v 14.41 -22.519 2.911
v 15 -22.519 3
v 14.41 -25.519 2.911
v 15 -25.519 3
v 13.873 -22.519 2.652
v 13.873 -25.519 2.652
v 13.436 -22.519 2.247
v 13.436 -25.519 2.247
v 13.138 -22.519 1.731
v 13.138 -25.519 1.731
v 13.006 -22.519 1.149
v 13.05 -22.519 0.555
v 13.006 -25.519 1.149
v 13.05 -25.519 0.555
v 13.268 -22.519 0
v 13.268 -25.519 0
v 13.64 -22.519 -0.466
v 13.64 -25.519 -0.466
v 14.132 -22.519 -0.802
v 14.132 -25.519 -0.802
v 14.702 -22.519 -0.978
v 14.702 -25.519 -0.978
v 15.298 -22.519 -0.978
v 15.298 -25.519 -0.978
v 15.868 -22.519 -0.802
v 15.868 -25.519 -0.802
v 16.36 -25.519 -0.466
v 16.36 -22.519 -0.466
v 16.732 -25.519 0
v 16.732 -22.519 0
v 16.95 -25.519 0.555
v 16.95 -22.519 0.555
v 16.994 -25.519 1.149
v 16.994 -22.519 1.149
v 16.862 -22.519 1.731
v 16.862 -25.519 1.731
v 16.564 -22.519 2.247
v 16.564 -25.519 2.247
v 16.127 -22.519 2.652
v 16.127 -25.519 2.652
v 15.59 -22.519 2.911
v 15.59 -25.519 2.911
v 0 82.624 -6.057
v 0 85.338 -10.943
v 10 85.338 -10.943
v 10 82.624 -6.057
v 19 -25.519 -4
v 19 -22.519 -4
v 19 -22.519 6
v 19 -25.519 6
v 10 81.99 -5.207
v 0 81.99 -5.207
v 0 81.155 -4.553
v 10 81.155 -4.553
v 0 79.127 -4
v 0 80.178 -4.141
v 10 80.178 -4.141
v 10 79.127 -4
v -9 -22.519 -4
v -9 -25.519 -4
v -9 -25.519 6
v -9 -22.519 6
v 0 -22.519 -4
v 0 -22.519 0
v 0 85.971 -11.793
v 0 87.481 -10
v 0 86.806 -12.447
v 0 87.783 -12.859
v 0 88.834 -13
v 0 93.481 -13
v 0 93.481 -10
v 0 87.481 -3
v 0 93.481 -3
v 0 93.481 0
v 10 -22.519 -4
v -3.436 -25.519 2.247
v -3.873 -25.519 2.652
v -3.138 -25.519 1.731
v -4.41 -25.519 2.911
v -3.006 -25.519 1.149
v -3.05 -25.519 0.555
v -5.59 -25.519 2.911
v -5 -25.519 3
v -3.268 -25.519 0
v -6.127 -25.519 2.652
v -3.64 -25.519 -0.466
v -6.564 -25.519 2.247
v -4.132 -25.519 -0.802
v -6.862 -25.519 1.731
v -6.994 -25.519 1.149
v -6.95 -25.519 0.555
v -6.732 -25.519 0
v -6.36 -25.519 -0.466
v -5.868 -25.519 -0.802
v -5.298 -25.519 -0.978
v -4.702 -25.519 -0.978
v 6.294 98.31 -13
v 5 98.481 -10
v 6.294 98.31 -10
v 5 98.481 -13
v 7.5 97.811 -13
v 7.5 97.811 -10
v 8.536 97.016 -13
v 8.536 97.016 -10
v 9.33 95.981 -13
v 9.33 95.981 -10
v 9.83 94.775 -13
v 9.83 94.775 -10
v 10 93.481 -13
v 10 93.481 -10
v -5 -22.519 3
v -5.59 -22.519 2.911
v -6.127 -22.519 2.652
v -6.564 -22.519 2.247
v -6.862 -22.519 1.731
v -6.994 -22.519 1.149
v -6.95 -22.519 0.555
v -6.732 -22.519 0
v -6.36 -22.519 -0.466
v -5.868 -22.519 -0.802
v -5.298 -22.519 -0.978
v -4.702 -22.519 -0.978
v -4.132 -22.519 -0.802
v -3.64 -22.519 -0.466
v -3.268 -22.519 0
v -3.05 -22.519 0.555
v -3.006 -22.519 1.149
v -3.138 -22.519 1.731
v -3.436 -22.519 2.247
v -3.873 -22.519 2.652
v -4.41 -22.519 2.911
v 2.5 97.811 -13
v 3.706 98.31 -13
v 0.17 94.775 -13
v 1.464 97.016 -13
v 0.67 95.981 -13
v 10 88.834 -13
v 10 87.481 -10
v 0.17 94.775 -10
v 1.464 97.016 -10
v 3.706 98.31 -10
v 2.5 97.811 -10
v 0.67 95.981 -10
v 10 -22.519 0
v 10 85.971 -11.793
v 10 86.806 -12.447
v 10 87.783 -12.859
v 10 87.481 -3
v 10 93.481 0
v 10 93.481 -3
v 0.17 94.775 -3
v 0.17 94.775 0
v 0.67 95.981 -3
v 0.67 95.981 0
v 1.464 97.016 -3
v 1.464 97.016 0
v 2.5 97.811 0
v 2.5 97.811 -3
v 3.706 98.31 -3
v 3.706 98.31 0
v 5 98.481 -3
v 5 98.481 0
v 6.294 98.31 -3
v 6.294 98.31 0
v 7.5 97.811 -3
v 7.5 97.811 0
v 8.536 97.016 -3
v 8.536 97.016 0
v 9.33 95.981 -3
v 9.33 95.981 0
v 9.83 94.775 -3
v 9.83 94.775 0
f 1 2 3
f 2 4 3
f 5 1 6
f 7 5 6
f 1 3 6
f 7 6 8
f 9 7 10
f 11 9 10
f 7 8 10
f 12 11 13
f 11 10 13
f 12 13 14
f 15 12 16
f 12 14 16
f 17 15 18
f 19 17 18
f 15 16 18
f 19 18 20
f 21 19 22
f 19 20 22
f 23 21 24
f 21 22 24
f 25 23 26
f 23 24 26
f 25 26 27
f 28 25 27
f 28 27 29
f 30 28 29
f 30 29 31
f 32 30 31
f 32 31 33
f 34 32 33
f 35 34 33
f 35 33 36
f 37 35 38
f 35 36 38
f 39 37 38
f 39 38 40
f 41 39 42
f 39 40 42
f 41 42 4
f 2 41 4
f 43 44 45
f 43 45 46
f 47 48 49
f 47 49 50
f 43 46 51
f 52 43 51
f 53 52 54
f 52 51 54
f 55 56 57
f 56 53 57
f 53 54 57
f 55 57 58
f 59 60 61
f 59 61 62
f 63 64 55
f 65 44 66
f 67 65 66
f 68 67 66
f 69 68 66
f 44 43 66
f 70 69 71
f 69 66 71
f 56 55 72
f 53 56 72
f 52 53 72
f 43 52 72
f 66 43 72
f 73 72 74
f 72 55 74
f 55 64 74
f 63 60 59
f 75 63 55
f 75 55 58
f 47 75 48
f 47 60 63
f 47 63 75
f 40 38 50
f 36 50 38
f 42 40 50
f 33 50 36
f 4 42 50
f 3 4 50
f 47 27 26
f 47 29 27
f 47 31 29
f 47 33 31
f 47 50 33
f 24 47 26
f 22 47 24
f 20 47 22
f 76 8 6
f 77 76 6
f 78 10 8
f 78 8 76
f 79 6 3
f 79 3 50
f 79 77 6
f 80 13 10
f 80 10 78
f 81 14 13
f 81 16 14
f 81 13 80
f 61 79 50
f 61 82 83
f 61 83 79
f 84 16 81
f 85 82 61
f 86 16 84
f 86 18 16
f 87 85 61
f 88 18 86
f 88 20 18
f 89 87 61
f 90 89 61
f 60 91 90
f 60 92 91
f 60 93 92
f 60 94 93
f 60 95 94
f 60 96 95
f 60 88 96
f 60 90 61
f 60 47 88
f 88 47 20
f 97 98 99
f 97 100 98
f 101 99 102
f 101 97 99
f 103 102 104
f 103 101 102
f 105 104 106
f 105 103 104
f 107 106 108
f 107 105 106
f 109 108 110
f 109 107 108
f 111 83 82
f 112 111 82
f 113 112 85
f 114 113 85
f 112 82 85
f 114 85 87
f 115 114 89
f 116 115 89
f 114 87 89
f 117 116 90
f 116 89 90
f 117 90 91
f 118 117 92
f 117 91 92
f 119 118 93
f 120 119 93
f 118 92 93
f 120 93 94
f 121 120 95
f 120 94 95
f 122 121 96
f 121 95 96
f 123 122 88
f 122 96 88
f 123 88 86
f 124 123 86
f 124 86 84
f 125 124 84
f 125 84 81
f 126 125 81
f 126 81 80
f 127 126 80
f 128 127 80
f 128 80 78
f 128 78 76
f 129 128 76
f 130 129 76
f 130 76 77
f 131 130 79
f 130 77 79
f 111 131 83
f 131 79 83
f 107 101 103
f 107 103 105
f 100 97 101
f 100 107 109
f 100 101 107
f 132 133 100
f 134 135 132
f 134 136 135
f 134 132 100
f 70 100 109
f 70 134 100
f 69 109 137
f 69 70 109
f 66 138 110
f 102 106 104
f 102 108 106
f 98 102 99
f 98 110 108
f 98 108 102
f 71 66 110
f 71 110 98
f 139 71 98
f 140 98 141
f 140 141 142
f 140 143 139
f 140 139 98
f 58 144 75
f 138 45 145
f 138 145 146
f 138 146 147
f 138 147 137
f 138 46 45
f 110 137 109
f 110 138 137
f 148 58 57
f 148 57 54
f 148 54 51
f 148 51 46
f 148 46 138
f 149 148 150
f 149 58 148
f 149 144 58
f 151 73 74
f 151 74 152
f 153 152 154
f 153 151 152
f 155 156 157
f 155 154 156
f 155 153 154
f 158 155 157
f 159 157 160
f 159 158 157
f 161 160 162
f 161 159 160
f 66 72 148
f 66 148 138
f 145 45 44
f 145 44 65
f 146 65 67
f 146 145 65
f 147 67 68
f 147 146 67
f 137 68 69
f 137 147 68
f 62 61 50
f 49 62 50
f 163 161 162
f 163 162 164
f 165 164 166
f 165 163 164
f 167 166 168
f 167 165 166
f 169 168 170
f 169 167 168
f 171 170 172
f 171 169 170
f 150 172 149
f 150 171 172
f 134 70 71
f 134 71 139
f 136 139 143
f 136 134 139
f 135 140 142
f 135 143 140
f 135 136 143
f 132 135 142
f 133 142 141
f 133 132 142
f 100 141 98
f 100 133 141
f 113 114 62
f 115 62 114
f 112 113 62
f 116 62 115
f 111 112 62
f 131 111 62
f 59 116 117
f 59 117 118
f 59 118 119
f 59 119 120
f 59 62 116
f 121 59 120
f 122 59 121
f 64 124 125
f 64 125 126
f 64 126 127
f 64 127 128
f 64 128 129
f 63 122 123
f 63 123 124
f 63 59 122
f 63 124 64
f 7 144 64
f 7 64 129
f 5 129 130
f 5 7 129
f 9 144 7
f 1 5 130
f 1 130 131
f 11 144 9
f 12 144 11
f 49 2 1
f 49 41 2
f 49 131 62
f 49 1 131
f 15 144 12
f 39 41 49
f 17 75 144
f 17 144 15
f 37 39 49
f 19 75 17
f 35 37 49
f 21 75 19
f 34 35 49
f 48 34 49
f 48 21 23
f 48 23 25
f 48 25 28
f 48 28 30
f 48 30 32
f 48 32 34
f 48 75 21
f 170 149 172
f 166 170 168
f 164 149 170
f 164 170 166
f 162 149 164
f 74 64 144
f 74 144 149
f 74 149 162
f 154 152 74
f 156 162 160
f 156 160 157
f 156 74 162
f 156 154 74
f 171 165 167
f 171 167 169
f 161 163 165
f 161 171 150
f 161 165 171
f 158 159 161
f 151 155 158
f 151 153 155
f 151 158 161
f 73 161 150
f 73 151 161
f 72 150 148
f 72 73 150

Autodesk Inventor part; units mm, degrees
ref_plane "YZ Plane" through (0, 0, 0) normal (1, 0, 0) x (0, 1, 0)
ref_plane "XZ Plane" through (0, 0, 0) normal (0, 1, 0) x (-1, 0, 0)
sketch "Sketch5" plane through (0, 0, 0) normal (1, 0, 0) x (0, 1, 0)
  line L0 (0, 0) -> (98.4806, 0)
  line L1 (98.4806, 0) -> (98.4806, -3)
  line L2 (98.4806, -3) -> (87.4806, -3)
  line L3 (87.4806, -3) -> (87.4806, -10)
  line L4 (87.4806, -10) -> (98.4806, -10)
  line L5 (98.4806, -10) -> (98.4806, -13)
  line L6 (98.4806, -13) -> (86.4806, -13)
  line L7 (86.4806, -13) -> (81.4806, -4)
  line L8 (-22.5194, 0) -> (0, 0)
  line L9 (-22.5194, -4) -> (81.4806, -4)
  line L10 (-22.5194, -4) -> (-22.5194, 0)
  dimension "d29" = 3
  dimension "d30" = 7
  dimension "d31" = 3
  dimension "d33" = 11
  dimension "d40" = 4
  dimension "d41" = 5
  dimension "d48" = 12
  dimension "d53" = 121
ref_plane "Work Plane1" through (0, 0, 0) normal (0, 0, 1) x (1, 0, 0)
extrude "Extrusion5" add sketch "Sketch5" along normal blind 10
fillet "Fillet1" radius 5 4 edges at (10, 98.4806, -11.5) (0, 98.4806, -11.5) (0, 98.4806, -1.5) (10, 98.4806, -1.5)
fillet "Fillet2" radius 4 2 edges at (5, 86.4806, -13) (5, 81.4806, -4)
sketch "Sketch7" plane through (0, -22.5194, -4) normal (0, 0, -1) x (1, 0, 0)
  line L0 (-9, 0) -> (19, 0)
  line L1 (19, 0) -> (19, 3)
  line L2 (19, 3) -> (-9, 3)
  line L3 (-9, 3) -> (-9, 0)
  line L4 (10, -107.857) -> (0, -107.857) projected
  line L5 (10, -101.6464) -> (0, -101.6464) projected
  line L6 (10, 0) -> (10, -101.6464) projected
  line L7 (0, 0) -> (10, 0) projected
  line L8 (0, 0) -> (0, -101.6464) projected
  point P0 (5, 3)
  point P1 (5, -107.857)
  point P2 (5, 0)
  dimension "d58" = 28
  dimension "d59" = 3
extrude "Extrusion6" add sketch "Sketch7" against normal blind 10 contours L3 L2 L1 L0
sketch "Sketch8" plane through (-9, -22.5194, -4) normal (0, 1, 0) x (1, 0, 0)
  line L0 (0, 0) -> (0, -10) projected
  line L1 (28, 0) -> (28, -10) projected
  point P0 (9, -4)
  point P1 (4, -5)
  point P2 (24, -5)
  point P3 (0, -5)
  point P4 (28, -5)
  dimension "d69" = 4
  dimension "d70" = 4
hole "Hole3" at (-5, -22.5194, 1) at (15, -22.5194, 1) direction (0, -1, 0) diameter 4 end through all
equation "\"d31\" = d29"
properties part number "2052"
